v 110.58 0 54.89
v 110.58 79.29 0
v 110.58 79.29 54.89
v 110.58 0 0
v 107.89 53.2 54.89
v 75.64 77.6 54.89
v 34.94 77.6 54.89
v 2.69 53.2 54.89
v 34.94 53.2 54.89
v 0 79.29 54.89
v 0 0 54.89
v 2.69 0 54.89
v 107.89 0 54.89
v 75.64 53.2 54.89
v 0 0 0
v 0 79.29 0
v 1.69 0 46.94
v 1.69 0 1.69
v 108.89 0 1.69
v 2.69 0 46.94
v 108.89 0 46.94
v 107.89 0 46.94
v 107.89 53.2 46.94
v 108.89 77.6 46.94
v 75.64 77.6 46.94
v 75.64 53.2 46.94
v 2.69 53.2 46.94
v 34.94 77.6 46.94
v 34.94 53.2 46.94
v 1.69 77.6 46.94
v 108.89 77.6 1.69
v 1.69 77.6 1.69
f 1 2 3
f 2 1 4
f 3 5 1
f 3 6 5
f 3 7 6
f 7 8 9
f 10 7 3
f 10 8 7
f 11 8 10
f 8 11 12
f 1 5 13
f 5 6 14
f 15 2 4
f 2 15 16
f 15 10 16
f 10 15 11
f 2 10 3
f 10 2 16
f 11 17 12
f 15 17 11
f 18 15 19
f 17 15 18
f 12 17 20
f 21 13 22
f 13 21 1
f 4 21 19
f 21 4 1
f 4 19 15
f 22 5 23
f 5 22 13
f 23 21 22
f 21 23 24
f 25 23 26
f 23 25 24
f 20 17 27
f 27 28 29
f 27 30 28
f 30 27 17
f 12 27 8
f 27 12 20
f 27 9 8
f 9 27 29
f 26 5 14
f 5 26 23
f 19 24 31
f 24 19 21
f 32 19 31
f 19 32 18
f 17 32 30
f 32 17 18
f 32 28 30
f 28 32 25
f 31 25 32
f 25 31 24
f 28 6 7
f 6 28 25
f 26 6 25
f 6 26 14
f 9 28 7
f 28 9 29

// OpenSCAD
twt = 1.69;
slop=.2;
ridge_x = 105.0+slop;
ridge_y = 53+slop;
ridge_z = 8.15-slop;

ridge_margin = 1.2-slop;
usb_z = 53+slop;
usb_y = 24.2+slop;
usb_x =40.5+slop;

outer_x =ridge_x + 2 * ridge_margin+2*twt;
difference() {
    cube([outer_x, ridge_y + usb_y+twt, usb_z+twt]);
    //kvm cutout
    translate([ridge_margin+twt, 0, usb_z - ridge_z+twt]) cube([ridge_x,ridge_y,ridge_z]);
    //center cutout
    translate([twt,0,twt]) cube([ridge_x + 2 * ridge_margin,ridge_y + usb_y, usb_z-ridge_z]);
    //usb
    translate([outer_x/2-usb_x/2,ridge_y,twt]) cube([usb_x, usb_y, usb_z]);
}
